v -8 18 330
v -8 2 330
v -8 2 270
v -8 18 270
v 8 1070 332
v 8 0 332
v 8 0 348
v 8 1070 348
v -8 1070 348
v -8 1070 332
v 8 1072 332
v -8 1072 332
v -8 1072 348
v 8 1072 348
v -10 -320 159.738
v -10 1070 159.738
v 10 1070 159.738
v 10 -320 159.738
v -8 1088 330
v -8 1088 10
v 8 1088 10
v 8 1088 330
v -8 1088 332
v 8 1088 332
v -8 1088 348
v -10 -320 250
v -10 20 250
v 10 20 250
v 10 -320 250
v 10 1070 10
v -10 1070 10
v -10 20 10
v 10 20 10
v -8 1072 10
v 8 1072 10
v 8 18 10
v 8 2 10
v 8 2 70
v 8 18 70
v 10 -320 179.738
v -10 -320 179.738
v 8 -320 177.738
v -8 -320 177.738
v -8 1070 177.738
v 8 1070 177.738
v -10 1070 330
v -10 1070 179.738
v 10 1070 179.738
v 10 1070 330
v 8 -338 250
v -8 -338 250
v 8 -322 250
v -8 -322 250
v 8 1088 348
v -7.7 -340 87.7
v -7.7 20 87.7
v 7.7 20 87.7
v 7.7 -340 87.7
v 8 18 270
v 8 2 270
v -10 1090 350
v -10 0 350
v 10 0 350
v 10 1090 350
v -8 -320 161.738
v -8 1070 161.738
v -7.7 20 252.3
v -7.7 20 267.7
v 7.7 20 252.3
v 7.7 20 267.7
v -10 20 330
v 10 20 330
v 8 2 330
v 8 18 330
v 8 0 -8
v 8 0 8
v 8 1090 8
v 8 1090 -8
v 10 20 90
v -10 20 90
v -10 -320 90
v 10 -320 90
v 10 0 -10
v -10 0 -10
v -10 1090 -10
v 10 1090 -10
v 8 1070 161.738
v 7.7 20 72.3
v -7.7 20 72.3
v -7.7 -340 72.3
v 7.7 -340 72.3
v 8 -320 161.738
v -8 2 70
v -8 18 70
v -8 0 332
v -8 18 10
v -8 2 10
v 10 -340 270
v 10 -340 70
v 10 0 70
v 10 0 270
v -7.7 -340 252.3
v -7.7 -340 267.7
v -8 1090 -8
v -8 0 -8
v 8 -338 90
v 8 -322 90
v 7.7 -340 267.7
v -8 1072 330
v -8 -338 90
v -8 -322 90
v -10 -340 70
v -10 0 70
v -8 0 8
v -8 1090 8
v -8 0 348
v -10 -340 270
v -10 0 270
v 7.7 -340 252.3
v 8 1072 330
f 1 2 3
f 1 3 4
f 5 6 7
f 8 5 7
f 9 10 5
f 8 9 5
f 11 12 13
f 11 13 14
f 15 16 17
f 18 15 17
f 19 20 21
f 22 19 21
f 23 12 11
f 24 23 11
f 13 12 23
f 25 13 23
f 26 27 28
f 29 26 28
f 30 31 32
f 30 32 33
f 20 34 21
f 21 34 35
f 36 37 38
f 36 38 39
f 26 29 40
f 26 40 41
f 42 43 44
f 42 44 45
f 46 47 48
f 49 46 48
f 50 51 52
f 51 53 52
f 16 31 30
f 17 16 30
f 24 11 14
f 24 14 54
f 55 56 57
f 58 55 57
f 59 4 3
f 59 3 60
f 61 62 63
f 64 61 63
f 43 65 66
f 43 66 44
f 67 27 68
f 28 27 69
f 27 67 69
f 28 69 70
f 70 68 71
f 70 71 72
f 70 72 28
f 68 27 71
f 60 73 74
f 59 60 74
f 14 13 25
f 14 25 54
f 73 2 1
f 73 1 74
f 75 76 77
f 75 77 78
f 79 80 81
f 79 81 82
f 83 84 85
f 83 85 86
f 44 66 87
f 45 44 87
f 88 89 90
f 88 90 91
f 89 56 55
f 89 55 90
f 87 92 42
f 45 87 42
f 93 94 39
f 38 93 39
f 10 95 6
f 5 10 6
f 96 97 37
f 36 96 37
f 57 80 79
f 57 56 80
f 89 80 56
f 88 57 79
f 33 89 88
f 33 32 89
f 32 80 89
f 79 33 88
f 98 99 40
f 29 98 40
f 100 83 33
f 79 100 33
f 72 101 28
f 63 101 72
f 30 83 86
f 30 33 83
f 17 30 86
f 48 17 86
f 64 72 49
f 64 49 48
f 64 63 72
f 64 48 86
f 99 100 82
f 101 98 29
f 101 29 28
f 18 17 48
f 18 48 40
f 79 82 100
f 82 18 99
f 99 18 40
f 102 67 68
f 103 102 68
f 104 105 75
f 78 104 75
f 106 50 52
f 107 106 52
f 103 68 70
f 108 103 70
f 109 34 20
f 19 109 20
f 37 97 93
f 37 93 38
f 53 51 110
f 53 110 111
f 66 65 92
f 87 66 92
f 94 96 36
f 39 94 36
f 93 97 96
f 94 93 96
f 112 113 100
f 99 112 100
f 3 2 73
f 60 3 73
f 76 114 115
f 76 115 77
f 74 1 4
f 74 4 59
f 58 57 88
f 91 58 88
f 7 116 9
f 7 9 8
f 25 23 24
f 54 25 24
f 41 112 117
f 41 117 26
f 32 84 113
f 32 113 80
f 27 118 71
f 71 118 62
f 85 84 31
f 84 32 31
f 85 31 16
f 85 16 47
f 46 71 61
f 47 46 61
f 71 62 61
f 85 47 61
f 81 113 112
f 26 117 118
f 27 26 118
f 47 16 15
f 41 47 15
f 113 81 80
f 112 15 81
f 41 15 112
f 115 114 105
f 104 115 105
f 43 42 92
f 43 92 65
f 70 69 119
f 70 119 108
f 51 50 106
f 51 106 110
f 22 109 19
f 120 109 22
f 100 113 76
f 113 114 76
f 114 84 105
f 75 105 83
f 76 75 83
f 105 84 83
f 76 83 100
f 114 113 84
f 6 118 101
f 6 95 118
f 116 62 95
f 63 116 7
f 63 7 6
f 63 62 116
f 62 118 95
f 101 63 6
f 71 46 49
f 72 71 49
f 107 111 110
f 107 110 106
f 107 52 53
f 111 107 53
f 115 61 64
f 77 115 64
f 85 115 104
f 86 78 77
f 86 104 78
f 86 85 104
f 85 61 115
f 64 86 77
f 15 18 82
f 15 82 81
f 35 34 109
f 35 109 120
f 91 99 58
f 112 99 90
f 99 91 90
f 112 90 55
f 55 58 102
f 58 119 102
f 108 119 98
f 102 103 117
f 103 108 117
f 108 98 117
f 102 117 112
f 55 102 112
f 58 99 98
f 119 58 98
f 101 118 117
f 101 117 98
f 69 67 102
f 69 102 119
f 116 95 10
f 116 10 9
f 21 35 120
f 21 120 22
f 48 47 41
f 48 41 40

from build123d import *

# Parameters (mm, degrees)
SKETCH1_W           = 2
SKETCH1_H           = 2
SKETCH1_W_2         = 1.6
SKETCH1_H_2         = 1.6
BOSS_EXTRUDE1_DEPTH = 109
SKETCH2_W           = 2
SKETCH2_H           = 2
SKETCH2_W_2         = 1.6
SKETCH2_H_2         = 1.6
BOSS_EXTRUDE2_DEPTH = 34
SKETCH3_W           = 2
SKETCH3_H           = 2
SKETCH3_W_2         = 1.6
SKETCH3_H_2         = 1.6
BOSS_EXTRUDE3_DEPTH = 6
SKETCH7_W           = 2
SKETCH7_H           = 2
SKETCH7_W_2         = 1.54
SKETCH7_H_2         = 1.54
BOSS_EXTRUDE4_DEPTH = 36
BOSS_EXTRUDE5_REACH = 28
SKETCH8_W           = 2
SKETCH8_H           = 2
SKETCH8_W_2         = 1.6
SKETCH8_H_2         = 1.6
SCALE2_SCALE        = 10
BOSS_EXTRUDE6_REACH = 1412
SKETCH9_W           = 20
SKETCH9_H           = 20
SKETCH9_W_2         = 16
SKETCH9_H_2         = 16


with BuildPart() as part:
    # Sketch1 → Boss-Extrude1 (new body)
    with BuildSketch(Plane(origin=(0, 0, 0), x_dir=(1, 0, 0), z_dir=(0, 1, 0))):
        Rectangle(SKETCH1_W, SKETCH1_H)
        Rectangle(SKETCH1_W_2, SKETCH1_H_2, mode=Mode.SUBTRACT)
    boss_extrude1 = extrude(amount=BOSS_EXTRUDE1_DEPTH)

    # Sketch2 → Boss-Extrude2 (add)
    with BuildSketch(Plane.XY.offset(1)):
        with Locations((0, 108)):
            Rectangle(SKETCH2_W, SKETCH2_H)
        with Locations((0, 108)):
            Rectangle(SKETCH2_W_2, SKETCH2_H_2, mode=Mode.SUBTRACT)
    extrude(amount=BOSS_EXTRUDE2_DEPTH)

    # Mirror1: Boss-Extrude1 across plane
    add(boss_extrude1.mirror(Plane.XY.offset(17)))

    # Sketch3 → Boss-Extrude3 (add)
    with BuildSketch(Plane.XY.offset(1)):
        with Locations((0, 1)):
            Rectangle(SKETCH3_W, SKETCH3_H)
        with Locations((0, 1)):
            Rectangle(SKETCH3_W_2, SKETCH3_H_2, mode=Mode.SUBTRACT)
    boss_extrude3 = extrude(amount=BOSS_EXTRUDE3_DEPTH)

    # Sketch7 → Boss-Extrude4 (add)
    with BuildSketch(Plane(origin=(0, 2, 0), x_dir=(1, 0, 0), z_dir=(0, 1, 0))):
        with Locations((0, -8)):
            Rectangle(SKETCH7_W, SKETCH7_H)
        with Locations((0, -8)):
            Rectangle(SKETCH7_W_2, SKETCH7_H_2, mode=Mode.SUBTRACT)
    boss_extrude4 = extrude(amount=-BOSS_EXTRUDE4_DEPTH)

    # Mirror2: Boss-Extrude3, Boss-Extrude4 across plane
    add(boss_extrude3.mirror(Plane.XY.offset(17)))
    add(boss_extrude4.mirror(Plane.XY.offset(17)))

    # Sketch8 → Boss-Extrude5 (add, up to next)
    with BuildSketch(Plane(origin=(0, 0, 25), x_dir=(-1, 0, 0), z_dir=(0, 0, -1)), mode=Mode.PRIVATE) as boss_extrude5_sk1:
        with Locations((0, -33)):
            Rectangle(SKETCH8_W, SKETCH8_H)
        with Locations((0, -33)):
            Rectangle(SKETCH8_W_2, SKETCH8_H_2, mode=Mode.SUBTRACT)
    boss_extrude5_tool1 = extrude(boss_extrude5_sk1.sketch, amount=BOSS_EXTRUDE5_REACH, mode=Mode.PRIVATE) - part.part
    add(boss_extrude5_tool1.solids().sort_by_distance((0, -32.028284, 25))[0])


with BuildPart() as part_1:
    # Scale2: scaled about (0, 0, 0)
    add(part.part.scale(SCALE2_SCALE))

    # Sketch9 → Boss-Extrude6 (add, up to next)
    with BuildSketch(Plane.XZ.offset(-1070), mode=Mode.PRIVATE) as boss_extrude6_sk1:
        with Locations((0, 169.738105544)):
            Rectangle(SKETCH9_W, SKETCH9_H)
        with Locations((0, 169.738105544)):
            Rectangle(SKETCH9_W_2, SKETCH9_H_2, mode=Mode.SUBTRACT)
    boss_extrude6_tool1 = extrude(boss_extrude6_sk1.sketch, amount=BOSS_EXTRUDE6_REACH, mode=Mode.PRIVATE) - part_1.part
    add(boss_extrude6_tool1.solids().sort_by_distance((0, 1070, 179.455263))[0])


solid = part_1.part
